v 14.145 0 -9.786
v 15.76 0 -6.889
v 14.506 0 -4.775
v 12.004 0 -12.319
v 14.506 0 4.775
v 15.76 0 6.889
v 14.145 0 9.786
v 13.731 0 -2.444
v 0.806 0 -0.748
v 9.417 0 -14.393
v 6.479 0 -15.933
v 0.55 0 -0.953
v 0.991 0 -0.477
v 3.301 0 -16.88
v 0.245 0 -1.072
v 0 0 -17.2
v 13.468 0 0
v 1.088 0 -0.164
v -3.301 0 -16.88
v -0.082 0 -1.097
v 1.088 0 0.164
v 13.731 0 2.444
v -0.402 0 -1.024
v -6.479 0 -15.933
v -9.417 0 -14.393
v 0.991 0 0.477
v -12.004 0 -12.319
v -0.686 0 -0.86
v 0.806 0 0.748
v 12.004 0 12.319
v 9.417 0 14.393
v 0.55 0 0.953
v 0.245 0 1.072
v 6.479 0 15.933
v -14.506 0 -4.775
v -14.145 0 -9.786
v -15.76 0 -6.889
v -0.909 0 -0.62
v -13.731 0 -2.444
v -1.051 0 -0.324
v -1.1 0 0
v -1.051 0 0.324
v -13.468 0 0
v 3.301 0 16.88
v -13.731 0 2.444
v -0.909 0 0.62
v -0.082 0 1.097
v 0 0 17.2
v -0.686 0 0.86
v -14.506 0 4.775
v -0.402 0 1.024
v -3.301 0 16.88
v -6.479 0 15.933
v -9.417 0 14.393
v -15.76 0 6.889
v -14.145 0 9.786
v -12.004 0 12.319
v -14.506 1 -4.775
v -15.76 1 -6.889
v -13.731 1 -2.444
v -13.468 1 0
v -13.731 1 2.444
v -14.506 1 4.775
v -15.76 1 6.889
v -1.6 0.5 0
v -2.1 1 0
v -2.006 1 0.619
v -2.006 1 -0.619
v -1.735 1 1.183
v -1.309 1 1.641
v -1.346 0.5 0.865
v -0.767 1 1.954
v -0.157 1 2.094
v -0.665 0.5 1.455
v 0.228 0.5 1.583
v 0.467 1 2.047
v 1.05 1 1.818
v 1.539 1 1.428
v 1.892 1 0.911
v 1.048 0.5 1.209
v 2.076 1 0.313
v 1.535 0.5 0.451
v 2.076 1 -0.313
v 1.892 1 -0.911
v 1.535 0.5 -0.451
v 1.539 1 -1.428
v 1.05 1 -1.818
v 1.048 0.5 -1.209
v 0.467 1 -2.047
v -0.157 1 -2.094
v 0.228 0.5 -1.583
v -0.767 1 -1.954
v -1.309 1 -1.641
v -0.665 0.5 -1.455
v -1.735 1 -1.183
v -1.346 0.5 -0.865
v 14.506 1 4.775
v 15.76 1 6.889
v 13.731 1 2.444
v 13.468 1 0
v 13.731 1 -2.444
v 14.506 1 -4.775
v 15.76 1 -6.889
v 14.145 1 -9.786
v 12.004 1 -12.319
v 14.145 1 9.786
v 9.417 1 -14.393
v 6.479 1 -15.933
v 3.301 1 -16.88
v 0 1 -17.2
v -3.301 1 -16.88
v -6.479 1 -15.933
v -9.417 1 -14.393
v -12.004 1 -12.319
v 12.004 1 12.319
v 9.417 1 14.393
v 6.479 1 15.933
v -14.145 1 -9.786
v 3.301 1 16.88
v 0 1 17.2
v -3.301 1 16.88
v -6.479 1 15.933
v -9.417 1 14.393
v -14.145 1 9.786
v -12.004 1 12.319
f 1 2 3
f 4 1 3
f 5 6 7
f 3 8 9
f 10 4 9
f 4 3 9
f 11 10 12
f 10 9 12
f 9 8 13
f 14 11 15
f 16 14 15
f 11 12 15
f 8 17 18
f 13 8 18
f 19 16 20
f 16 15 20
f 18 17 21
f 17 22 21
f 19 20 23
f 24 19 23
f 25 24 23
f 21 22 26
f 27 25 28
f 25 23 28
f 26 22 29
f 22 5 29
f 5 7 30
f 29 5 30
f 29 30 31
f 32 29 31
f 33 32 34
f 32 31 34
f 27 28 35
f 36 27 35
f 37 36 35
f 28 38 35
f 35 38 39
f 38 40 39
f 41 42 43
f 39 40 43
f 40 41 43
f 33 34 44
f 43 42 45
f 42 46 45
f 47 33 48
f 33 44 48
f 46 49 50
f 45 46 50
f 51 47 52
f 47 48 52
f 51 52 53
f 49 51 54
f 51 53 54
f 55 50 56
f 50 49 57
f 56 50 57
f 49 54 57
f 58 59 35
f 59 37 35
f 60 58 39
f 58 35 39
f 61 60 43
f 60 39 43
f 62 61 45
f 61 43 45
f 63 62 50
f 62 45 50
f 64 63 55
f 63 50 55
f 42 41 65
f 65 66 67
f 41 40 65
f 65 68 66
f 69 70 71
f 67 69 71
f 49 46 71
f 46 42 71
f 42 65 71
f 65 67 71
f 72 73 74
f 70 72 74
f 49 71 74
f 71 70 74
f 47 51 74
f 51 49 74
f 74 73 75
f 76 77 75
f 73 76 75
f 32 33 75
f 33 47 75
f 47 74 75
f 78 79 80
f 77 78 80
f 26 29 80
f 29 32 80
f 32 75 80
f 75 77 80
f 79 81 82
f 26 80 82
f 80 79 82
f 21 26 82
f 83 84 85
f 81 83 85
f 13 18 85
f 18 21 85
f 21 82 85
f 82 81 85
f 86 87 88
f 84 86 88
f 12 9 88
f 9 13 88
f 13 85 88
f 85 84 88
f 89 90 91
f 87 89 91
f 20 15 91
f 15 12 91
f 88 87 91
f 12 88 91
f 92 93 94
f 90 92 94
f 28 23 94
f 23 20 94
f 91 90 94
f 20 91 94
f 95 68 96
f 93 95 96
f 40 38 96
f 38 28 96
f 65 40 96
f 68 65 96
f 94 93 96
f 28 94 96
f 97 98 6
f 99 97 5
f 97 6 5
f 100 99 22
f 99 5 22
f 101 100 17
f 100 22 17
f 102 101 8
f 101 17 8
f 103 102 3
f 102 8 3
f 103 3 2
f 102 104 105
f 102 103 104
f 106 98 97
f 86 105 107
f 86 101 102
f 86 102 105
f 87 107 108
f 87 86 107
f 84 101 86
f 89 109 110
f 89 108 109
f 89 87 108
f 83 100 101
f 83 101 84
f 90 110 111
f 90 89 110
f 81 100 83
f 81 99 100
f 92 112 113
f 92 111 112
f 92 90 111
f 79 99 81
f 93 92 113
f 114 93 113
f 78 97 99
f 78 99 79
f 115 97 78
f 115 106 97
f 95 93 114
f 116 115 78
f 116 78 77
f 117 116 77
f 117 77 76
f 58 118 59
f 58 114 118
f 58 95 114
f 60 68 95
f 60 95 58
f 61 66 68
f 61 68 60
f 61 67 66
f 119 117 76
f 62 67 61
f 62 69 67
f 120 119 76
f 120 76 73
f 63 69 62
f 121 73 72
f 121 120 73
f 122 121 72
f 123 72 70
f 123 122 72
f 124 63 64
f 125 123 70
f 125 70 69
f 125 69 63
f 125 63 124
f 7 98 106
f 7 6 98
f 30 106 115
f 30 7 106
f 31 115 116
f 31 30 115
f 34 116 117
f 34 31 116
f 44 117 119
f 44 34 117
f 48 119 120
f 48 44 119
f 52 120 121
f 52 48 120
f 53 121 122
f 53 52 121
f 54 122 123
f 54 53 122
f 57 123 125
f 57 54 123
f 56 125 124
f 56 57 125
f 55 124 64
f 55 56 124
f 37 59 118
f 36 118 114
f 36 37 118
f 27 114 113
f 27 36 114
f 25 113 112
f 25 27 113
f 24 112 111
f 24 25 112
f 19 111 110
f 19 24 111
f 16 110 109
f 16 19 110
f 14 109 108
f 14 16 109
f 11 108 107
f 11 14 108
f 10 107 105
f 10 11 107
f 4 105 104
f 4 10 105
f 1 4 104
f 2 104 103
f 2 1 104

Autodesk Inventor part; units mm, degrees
ref_plane "YZ Plane" through (0, 0, 0) normal (1, 0, 0) x (0, 1, 0)
ref_plane "XZ Plane" through (0, 0, 0) normal (0, 1, 0) x (-1, 0, 0)
ref_plane "XY Plane" through (0, 0, 0) normal (0, 0, 1) x (1, 0, 0)
sketch "スケッチ1" plane through (0, 0, 0) normal (0, 1, 0) x (-1, 0, 0)
  line L0 (0, -24.08) -> (0, 24.08) projected
  line L1 (-51.0552, 0) -> (51.0552, 0) projected
  circle A0 centre (0, 0) radius 17.2
  circle A1 centre (0, 0) radius 1.1
  circle A2 centre (24.968, 0) radius 11.5
  circle A3 centre (-24.968, 0) radius 11.5
  line L2 (1.9153, -7.1479) -> (2.64, -9.8524)
  arc A4 (-1.9153, -7.1479) -> (1.9153, -7.1479) centre (0, 0) ccw
  line L3 (-1.9153, -7.1479) -> (-2.64, -9.8524)
  line L4 (0, -11) -> (0.5714, -10.184)
  line L5 (0, -11) -> (-0.5714, -10.184)
  arc A5 (-2.64, -9.8524) -> (-0.5714, -10.184) centre (0, 0) ccw
  arc A6 (0.5714, -10.184) -> (2.64, -9.8524) centre (0, 0) ccw
  point P0 (-15.76, 6.8893)
  point P1 (-15.76, -6.8893)
  point P2 (15.76, -6.8893)
  point P3 (15.76, 6.8893)
  dimension "d0" = 34.4
  dimension "d1" = 2.2
  dimension "d2" = 24.968
  dimension "d3" = 23
  dimension "d8" = 30
  dimension "d9" = 7.4
  dimension "d11" = 10.2
  dimension "d12" = 11
  dimension "d13" = 70
extrude "押し出し1" add sketch "スケッチ1" along normal blind 1 contours A0 A3 L1 A1 L0 A4 L3 A5 L5 | L0 L4 A6 L2 A4 A1 L1 A2 A0 | L5 A5 L3 A4 L0 | L0 A4 L2 A6 L4 | A3 A0 L0 A1 L1 | L1 A1 L0 A0 A2
chamfer "面取り1" distance 1 angle 45 1 edges at (1.1, 1, 0)
properties part number "GearCenterCover"
